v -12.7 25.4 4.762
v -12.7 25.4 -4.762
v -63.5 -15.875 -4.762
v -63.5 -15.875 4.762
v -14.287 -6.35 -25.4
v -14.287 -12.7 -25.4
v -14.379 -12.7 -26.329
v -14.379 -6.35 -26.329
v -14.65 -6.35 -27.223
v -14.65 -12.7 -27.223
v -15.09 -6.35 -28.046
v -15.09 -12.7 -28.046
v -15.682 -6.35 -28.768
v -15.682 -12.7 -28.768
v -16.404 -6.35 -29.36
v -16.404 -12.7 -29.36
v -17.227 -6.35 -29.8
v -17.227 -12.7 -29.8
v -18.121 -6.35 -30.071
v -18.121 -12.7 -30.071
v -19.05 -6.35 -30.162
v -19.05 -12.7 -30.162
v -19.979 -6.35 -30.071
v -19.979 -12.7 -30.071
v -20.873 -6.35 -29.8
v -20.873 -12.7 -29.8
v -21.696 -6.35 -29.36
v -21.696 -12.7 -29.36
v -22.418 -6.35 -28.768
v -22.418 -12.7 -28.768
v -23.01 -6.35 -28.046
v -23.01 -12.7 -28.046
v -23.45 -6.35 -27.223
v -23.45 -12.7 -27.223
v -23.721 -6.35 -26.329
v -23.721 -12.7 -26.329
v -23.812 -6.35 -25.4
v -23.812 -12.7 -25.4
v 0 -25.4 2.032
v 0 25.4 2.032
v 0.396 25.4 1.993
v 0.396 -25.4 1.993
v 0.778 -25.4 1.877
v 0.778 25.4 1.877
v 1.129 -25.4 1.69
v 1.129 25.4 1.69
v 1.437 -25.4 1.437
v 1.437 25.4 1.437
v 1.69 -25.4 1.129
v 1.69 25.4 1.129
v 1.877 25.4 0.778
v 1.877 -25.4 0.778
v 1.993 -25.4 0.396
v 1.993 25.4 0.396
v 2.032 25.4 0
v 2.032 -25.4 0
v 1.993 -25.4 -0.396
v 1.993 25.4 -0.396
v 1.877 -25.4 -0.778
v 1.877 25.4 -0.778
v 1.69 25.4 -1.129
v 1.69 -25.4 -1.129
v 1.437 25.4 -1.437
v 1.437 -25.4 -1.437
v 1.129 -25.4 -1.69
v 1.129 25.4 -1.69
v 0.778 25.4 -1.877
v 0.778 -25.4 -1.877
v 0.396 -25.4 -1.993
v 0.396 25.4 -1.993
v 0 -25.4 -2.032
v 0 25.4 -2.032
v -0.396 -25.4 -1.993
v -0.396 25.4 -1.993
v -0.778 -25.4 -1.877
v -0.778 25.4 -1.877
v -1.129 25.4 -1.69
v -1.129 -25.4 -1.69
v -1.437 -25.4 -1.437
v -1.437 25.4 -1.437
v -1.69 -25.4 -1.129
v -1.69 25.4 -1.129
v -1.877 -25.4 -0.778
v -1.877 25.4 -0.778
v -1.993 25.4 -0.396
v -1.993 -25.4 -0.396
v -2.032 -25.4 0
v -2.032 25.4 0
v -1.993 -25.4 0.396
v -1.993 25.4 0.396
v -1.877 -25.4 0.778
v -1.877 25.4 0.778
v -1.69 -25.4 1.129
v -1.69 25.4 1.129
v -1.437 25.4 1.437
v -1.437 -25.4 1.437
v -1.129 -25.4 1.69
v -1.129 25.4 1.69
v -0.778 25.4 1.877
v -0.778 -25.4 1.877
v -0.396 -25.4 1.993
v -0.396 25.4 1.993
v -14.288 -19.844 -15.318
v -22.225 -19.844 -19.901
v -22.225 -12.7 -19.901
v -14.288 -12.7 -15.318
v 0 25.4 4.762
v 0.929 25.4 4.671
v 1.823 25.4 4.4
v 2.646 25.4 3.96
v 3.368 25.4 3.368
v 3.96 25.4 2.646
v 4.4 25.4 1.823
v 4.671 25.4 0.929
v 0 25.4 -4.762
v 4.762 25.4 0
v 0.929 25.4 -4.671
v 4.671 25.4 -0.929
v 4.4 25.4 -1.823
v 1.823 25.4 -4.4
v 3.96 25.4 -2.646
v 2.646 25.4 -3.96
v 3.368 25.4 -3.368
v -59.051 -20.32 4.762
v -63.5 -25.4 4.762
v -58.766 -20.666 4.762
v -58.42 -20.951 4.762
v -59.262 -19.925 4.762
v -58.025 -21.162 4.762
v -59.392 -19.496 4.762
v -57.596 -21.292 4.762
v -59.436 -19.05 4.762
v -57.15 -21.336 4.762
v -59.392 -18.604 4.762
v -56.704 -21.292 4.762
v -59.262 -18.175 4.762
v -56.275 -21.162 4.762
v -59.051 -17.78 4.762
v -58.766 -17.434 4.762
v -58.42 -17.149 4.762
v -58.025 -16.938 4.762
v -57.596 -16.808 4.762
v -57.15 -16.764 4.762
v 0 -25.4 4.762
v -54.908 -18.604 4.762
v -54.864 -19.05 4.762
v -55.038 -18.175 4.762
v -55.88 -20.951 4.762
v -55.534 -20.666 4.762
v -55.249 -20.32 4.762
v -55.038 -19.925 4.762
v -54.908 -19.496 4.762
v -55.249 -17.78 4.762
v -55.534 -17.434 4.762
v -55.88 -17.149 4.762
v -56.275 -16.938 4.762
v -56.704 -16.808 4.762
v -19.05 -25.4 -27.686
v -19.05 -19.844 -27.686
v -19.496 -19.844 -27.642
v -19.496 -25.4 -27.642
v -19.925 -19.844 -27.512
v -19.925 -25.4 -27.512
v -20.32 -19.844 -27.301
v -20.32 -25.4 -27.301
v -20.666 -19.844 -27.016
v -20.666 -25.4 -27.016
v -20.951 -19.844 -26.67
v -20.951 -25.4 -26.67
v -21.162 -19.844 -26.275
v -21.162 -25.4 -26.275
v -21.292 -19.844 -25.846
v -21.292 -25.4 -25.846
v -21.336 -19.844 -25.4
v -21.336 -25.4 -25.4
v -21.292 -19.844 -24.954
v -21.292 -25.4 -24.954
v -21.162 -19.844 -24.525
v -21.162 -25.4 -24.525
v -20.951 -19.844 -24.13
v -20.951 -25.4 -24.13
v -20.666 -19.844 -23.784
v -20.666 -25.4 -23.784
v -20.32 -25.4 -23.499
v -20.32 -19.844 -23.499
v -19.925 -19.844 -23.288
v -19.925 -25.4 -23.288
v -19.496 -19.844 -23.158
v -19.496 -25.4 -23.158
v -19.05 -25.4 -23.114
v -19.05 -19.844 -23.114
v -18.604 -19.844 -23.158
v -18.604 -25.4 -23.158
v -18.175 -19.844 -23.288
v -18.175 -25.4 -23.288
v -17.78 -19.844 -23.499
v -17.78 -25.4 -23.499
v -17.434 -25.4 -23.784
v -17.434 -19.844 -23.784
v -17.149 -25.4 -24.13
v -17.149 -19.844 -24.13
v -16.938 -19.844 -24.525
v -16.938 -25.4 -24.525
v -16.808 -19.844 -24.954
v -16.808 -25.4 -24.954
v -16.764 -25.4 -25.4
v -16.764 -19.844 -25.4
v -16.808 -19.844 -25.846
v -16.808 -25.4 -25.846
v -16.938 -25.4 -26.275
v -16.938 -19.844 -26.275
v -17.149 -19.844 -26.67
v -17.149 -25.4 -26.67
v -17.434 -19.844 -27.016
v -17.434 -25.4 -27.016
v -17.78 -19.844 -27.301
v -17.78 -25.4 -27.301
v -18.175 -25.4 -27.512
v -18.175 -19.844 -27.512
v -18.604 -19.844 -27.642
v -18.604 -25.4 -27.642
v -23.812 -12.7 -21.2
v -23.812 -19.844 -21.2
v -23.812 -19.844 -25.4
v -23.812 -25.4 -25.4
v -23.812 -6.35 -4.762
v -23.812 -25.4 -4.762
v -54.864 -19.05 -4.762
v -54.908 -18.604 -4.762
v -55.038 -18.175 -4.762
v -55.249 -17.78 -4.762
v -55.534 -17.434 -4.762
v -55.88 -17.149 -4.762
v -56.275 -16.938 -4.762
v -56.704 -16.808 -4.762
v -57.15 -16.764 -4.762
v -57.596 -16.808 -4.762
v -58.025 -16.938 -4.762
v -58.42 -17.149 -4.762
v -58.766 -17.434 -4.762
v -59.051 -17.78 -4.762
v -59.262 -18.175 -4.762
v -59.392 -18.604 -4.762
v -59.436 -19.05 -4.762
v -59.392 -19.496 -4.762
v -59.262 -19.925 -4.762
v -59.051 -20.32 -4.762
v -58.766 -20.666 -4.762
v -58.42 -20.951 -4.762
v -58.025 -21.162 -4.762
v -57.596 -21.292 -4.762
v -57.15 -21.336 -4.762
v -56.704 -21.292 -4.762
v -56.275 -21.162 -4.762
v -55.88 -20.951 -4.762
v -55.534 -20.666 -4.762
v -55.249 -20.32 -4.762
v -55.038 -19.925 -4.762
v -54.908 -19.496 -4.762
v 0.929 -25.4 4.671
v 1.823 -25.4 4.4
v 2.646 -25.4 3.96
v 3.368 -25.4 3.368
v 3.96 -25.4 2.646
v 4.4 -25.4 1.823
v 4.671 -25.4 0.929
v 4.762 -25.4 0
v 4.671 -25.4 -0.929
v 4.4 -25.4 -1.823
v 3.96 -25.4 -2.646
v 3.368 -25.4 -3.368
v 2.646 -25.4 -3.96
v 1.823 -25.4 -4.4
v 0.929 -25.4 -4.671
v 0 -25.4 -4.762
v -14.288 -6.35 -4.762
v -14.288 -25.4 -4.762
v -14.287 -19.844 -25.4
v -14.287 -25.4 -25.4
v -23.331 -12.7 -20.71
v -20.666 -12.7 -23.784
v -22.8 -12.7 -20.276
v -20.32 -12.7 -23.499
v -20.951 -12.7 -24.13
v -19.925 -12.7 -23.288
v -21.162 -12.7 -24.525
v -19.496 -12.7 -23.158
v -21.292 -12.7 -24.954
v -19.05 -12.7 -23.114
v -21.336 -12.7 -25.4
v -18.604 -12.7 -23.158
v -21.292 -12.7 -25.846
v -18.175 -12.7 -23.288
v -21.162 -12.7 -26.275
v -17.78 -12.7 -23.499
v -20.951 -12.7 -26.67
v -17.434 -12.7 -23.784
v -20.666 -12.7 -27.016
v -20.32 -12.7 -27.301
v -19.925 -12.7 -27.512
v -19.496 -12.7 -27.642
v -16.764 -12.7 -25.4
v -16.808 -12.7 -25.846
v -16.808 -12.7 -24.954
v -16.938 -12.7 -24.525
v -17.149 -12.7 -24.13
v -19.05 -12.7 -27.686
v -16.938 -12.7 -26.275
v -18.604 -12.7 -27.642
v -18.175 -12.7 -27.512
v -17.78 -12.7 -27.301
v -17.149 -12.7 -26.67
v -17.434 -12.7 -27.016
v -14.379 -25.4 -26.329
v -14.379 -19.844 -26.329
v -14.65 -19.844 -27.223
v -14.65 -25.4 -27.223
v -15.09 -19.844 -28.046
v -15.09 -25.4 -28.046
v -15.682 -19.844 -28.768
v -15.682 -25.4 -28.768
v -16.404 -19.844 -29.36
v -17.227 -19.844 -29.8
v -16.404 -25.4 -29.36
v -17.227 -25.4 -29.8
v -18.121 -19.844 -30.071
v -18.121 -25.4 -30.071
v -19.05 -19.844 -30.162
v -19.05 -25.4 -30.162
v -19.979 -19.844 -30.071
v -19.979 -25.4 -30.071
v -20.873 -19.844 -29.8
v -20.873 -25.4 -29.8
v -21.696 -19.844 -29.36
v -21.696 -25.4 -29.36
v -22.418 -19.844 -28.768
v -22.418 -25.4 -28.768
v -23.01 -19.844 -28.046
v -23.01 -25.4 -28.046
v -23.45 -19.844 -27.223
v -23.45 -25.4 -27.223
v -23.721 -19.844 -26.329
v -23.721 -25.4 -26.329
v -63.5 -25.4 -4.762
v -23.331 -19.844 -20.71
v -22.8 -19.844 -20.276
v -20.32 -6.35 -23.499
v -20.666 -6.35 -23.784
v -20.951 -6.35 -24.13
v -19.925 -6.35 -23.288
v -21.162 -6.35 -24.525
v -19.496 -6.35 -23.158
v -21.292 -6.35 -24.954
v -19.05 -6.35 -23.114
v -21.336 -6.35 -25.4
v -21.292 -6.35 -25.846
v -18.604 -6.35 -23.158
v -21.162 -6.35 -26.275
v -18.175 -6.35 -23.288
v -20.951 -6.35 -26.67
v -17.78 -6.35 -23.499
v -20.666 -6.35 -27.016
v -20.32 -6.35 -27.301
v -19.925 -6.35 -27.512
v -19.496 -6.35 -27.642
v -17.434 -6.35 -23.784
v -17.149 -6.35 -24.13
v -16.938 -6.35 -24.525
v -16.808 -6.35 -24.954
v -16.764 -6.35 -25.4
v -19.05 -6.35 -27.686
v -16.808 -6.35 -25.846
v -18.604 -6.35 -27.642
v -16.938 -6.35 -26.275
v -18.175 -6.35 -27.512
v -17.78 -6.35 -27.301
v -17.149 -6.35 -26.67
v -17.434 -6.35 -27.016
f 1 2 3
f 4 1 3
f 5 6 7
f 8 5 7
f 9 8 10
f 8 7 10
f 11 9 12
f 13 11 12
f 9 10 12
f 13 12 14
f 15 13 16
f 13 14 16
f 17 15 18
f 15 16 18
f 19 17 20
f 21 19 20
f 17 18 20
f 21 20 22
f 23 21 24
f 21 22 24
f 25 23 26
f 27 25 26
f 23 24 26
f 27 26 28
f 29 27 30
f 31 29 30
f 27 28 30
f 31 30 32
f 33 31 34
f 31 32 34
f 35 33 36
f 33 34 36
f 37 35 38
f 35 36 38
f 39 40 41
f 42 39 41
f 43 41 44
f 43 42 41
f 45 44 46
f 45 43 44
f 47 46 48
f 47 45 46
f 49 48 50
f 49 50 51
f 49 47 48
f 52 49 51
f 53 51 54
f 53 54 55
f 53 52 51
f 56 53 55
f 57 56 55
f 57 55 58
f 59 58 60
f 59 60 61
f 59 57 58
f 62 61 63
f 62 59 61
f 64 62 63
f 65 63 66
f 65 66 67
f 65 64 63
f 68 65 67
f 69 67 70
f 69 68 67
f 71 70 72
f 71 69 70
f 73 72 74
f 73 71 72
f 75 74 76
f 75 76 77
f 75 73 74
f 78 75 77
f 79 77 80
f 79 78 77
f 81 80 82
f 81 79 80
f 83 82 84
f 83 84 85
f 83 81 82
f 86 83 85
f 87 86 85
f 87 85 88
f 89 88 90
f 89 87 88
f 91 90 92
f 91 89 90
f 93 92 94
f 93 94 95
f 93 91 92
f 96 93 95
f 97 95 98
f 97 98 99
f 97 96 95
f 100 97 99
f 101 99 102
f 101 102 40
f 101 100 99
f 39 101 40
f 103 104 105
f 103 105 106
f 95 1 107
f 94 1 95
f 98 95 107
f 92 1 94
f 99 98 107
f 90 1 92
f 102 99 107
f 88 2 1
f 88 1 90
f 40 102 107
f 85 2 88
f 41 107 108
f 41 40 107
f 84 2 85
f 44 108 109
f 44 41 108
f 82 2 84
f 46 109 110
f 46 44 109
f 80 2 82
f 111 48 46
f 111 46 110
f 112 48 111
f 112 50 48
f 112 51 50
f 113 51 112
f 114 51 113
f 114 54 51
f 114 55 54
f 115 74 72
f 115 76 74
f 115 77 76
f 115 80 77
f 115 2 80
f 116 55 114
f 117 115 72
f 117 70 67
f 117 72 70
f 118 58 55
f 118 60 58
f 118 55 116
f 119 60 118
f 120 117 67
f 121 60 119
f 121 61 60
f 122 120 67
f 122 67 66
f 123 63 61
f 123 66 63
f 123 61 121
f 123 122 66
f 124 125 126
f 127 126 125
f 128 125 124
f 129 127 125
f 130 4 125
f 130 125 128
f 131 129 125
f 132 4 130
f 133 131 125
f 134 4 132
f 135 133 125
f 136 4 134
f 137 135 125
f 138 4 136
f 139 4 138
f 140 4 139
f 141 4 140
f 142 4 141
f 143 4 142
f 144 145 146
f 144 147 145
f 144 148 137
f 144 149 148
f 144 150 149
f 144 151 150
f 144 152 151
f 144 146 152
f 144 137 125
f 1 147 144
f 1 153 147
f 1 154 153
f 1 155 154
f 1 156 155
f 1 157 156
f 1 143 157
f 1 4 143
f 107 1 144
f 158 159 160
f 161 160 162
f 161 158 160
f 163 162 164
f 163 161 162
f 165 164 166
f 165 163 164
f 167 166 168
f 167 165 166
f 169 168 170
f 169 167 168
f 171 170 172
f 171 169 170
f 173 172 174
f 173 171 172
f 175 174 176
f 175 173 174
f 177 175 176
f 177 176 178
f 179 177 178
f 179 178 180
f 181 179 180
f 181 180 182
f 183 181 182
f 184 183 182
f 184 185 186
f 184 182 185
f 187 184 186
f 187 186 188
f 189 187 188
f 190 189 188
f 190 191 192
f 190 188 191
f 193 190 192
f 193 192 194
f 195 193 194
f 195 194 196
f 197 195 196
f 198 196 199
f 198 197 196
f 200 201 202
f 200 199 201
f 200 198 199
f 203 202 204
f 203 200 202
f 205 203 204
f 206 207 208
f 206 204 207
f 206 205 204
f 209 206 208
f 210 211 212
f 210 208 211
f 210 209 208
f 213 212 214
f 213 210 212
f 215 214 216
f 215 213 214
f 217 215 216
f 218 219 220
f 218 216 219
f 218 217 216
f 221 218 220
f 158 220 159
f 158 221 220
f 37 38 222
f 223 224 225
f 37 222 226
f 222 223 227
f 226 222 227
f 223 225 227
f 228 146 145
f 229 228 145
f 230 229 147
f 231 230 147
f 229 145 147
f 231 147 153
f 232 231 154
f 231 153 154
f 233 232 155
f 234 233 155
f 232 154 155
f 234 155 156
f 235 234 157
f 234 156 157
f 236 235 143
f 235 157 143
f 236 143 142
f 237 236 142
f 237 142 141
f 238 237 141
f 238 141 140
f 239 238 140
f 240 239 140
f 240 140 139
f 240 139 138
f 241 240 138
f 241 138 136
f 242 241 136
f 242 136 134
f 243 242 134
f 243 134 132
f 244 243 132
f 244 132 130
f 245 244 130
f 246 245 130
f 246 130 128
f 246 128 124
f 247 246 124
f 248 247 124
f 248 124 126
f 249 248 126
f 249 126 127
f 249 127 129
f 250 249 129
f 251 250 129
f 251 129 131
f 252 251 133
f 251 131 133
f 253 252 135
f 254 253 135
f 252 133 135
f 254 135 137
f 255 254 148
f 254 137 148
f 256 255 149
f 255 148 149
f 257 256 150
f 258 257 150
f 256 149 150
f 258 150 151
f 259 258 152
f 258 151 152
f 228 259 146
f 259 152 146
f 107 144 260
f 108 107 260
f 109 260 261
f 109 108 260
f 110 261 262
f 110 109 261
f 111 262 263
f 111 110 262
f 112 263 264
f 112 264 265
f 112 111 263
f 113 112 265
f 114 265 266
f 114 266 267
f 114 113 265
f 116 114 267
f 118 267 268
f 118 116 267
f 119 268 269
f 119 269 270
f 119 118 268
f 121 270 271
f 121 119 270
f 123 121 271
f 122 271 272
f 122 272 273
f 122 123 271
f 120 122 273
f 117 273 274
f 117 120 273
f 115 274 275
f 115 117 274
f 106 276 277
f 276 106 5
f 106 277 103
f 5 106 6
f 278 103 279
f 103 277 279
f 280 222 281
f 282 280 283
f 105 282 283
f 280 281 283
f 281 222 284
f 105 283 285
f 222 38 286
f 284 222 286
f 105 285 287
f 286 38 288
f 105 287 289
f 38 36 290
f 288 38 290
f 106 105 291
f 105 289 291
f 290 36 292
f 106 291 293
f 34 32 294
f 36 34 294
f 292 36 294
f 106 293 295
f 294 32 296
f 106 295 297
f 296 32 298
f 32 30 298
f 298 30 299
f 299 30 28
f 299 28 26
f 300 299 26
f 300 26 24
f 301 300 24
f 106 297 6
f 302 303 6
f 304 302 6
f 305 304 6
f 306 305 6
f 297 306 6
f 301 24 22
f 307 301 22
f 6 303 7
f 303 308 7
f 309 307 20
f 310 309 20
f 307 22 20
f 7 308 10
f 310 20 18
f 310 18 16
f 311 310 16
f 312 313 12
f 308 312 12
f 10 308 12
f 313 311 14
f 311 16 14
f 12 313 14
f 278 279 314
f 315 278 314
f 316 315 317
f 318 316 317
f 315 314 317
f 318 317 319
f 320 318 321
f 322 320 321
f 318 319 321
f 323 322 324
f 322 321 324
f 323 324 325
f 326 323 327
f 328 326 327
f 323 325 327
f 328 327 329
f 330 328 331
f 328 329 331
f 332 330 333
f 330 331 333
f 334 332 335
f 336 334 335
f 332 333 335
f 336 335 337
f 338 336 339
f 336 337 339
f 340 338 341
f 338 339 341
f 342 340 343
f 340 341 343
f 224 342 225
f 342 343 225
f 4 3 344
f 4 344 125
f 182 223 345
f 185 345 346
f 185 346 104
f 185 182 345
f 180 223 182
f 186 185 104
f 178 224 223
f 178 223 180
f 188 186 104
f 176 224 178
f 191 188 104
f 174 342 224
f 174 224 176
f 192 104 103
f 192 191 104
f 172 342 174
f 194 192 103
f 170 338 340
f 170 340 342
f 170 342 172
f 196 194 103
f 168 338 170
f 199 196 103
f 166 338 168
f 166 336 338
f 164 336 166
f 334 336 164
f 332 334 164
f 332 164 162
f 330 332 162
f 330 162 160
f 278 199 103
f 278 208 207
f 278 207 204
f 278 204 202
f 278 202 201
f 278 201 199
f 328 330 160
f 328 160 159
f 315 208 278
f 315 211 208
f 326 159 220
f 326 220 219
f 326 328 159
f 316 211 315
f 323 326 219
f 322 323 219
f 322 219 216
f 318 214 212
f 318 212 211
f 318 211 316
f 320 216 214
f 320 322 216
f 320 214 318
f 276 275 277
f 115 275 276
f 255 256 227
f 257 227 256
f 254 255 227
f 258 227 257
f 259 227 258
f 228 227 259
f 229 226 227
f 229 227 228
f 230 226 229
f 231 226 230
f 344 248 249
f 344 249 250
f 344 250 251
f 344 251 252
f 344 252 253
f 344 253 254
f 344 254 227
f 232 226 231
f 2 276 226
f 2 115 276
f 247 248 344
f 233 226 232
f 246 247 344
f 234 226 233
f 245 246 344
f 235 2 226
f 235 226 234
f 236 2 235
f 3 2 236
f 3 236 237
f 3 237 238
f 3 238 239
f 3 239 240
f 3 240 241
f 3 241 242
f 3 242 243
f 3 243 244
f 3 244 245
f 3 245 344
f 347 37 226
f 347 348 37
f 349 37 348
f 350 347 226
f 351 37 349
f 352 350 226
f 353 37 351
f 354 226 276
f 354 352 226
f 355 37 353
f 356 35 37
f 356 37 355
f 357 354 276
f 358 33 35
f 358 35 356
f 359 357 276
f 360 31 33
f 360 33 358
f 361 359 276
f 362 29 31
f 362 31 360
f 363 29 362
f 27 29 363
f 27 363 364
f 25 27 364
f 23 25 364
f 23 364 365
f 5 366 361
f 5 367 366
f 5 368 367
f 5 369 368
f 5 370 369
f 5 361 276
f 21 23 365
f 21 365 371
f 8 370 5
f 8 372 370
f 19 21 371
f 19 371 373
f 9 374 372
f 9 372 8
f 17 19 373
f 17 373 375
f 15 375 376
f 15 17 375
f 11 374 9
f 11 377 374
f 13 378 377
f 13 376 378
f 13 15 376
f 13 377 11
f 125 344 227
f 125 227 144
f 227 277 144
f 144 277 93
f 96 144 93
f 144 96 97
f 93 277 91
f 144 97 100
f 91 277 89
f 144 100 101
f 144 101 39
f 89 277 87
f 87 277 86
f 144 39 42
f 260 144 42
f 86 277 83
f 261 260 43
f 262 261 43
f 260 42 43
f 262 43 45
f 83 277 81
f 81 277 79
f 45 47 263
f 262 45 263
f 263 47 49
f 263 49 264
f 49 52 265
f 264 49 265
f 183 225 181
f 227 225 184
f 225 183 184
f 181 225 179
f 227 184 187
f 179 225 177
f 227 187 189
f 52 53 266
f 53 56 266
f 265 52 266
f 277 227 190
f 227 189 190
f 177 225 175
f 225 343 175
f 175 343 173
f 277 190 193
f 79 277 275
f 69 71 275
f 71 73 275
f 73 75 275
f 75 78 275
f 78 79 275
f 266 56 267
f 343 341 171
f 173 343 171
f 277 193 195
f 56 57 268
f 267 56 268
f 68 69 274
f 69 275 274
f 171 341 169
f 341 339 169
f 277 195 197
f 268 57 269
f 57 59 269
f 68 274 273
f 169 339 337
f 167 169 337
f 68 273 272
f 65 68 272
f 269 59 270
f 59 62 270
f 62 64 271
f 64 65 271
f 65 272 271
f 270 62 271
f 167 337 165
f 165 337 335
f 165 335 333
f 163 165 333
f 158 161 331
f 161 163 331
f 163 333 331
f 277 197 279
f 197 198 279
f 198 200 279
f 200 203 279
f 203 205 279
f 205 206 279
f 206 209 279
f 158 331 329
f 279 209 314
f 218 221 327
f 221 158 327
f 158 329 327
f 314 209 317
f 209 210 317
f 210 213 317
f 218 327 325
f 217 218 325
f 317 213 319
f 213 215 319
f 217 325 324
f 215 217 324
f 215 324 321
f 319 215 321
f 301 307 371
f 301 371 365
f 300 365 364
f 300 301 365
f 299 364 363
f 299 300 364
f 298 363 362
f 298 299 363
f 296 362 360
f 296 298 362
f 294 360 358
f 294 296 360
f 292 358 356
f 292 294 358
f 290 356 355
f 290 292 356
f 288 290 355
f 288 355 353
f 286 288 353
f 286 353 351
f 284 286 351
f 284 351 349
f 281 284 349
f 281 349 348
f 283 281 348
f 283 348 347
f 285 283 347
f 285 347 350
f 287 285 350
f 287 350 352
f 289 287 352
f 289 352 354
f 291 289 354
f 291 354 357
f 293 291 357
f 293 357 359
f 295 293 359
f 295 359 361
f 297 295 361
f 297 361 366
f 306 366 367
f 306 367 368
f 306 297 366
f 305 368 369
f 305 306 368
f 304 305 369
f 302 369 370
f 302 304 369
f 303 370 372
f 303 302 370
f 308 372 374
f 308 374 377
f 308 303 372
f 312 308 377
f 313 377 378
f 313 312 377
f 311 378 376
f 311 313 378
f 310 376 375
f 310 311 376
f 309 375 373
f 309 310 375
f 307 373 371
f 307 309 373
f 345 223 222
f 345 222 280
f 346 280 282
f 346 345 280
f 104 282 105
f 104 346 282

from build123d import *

# Parameters (mm, degrees)
SKETCH1_R           = 2.032
BOSS_EXTRUDE1_DEPTH = 25.4
SKETCH5_R           = 2.286
BOSS_EXTRUDE2_DEPTH = 19.05
SKETCH2_R           = 2.286
CUT_EXTRUDE1_DEPTH  = 77.793005053
CUT_EXTRUDE2_START  = 5.55625
CUT_EXTRUDE2_DEPTH  = 7.14375
CUT_EXTRUDE3_DEPTH  = 73.955945611


with BuildPart() as part:
    # Sketch1 → Boss-Extrude1 (new, symmetric)
    with BuildSketch(Plane(origin=(0, 0, 0), x_dir=(1, 0, 0), z_dir=(0, 1, 0))):
        with BuildLine():
            Line((0, 4.7625), (-63.5, 4.7625))
            Line((-63.5, 4.7625), (-63.5, -4.7625))
            Line((-63.5, -4.7625), (0, -4.7625))
            ThreePointArc((0, -4.7625), (4.7625, 0), (0, 4.7625))
        make_face()
        with Locations(Location((0, 0, 0), (0, 0, 270))):
            Circle(SKETCH1_R, mode=Mode.SUBTRACT)
    extrude(amount=BOSS_EXTRUDE1_DEPTH, both=True)

    # Sketch5 → Boss-Extrude2 (add)
    with BuildSketch(Plane(origin=(0, -25.4, 0), x_dir=(1, 0, 0), z_dir=(0, 1, 0))):
        with BuildLine():
            Line((-23.8125, 25.4), (-23.8125, 4.7625))
            Line((-23.8125, 4.7625), (-14.2875, 4.7625))
            Line((-14.2875, 4.7625), (-14.2875, 25.4))
            ThreePointArc((-14.2875, 25.4), (-19.05, 30.1625), (-23.8125, 25.4))
        make_face()
        with Locations(Location((-19.05, 25.4, 0), (0, 0, 90))):
            Circle(SKETCH5_R, mode=Mode.SUBTRACT)
    extrude(amount=BOSS_EXTRUDE2_DEPTH)

    # Sketch2 → Cut-Extrude1 (cut, through all)
    with BuildSketch(Plane.XY.offset(4.7625)):
        with Locations((-57.15, -19.05)):
            Circle(SKETCH2_R)
    extrude(amount=-CUT_EXTRUDE1_DEPTH, mode=Mode.SUBTRACT)

    # Sketch3 → Cut-Extrude2 (cut)
    with BuildSketch(Plane(origin=(0, -25.4, 0), x_dir=(1, 0, 0), z_dir=(0, 1, 0)).offset(CUT_EXTRUDE2_START)):
        with BuildLine():
            Line((-22.225, 19.900738686), (-14.2875, 15.318020924))
            Line((-14.2875, 15.318020924), (-14.2875, 25.4))
            ThreePointArc((-14.2875, 25.4), (-19.05, 30.1625), (-23.8125, 25.4))
            Line((-23.8125, 25.4), (-23.8125, 21.199869794))
            ThreePointArc((-23.8125, 21.199869794), (-23.071555914, 20.485776966), (-22.225, 19.900738686))
        make_face()
    extrude(amount=CUT_EXTRUDE2_DEPTH, mode=Mode.SUBTRACT)

    # Sketch4 → Cut-Extrude3 (cut, through all)
    with BuildSketch(Plane(origin=(0, 0, -4.7625), x_dir=(-1, 0, 0), z_dir=(0, 0, -1))):
        Polygon((12.7, 25.4), (63.5, -15.875), (63.5, 25.4), align=None)
    extrude(amount=-CUT_EXTRUDE3_DEPTH, mode=Mode.SUBTRACT)


solid = part.part
